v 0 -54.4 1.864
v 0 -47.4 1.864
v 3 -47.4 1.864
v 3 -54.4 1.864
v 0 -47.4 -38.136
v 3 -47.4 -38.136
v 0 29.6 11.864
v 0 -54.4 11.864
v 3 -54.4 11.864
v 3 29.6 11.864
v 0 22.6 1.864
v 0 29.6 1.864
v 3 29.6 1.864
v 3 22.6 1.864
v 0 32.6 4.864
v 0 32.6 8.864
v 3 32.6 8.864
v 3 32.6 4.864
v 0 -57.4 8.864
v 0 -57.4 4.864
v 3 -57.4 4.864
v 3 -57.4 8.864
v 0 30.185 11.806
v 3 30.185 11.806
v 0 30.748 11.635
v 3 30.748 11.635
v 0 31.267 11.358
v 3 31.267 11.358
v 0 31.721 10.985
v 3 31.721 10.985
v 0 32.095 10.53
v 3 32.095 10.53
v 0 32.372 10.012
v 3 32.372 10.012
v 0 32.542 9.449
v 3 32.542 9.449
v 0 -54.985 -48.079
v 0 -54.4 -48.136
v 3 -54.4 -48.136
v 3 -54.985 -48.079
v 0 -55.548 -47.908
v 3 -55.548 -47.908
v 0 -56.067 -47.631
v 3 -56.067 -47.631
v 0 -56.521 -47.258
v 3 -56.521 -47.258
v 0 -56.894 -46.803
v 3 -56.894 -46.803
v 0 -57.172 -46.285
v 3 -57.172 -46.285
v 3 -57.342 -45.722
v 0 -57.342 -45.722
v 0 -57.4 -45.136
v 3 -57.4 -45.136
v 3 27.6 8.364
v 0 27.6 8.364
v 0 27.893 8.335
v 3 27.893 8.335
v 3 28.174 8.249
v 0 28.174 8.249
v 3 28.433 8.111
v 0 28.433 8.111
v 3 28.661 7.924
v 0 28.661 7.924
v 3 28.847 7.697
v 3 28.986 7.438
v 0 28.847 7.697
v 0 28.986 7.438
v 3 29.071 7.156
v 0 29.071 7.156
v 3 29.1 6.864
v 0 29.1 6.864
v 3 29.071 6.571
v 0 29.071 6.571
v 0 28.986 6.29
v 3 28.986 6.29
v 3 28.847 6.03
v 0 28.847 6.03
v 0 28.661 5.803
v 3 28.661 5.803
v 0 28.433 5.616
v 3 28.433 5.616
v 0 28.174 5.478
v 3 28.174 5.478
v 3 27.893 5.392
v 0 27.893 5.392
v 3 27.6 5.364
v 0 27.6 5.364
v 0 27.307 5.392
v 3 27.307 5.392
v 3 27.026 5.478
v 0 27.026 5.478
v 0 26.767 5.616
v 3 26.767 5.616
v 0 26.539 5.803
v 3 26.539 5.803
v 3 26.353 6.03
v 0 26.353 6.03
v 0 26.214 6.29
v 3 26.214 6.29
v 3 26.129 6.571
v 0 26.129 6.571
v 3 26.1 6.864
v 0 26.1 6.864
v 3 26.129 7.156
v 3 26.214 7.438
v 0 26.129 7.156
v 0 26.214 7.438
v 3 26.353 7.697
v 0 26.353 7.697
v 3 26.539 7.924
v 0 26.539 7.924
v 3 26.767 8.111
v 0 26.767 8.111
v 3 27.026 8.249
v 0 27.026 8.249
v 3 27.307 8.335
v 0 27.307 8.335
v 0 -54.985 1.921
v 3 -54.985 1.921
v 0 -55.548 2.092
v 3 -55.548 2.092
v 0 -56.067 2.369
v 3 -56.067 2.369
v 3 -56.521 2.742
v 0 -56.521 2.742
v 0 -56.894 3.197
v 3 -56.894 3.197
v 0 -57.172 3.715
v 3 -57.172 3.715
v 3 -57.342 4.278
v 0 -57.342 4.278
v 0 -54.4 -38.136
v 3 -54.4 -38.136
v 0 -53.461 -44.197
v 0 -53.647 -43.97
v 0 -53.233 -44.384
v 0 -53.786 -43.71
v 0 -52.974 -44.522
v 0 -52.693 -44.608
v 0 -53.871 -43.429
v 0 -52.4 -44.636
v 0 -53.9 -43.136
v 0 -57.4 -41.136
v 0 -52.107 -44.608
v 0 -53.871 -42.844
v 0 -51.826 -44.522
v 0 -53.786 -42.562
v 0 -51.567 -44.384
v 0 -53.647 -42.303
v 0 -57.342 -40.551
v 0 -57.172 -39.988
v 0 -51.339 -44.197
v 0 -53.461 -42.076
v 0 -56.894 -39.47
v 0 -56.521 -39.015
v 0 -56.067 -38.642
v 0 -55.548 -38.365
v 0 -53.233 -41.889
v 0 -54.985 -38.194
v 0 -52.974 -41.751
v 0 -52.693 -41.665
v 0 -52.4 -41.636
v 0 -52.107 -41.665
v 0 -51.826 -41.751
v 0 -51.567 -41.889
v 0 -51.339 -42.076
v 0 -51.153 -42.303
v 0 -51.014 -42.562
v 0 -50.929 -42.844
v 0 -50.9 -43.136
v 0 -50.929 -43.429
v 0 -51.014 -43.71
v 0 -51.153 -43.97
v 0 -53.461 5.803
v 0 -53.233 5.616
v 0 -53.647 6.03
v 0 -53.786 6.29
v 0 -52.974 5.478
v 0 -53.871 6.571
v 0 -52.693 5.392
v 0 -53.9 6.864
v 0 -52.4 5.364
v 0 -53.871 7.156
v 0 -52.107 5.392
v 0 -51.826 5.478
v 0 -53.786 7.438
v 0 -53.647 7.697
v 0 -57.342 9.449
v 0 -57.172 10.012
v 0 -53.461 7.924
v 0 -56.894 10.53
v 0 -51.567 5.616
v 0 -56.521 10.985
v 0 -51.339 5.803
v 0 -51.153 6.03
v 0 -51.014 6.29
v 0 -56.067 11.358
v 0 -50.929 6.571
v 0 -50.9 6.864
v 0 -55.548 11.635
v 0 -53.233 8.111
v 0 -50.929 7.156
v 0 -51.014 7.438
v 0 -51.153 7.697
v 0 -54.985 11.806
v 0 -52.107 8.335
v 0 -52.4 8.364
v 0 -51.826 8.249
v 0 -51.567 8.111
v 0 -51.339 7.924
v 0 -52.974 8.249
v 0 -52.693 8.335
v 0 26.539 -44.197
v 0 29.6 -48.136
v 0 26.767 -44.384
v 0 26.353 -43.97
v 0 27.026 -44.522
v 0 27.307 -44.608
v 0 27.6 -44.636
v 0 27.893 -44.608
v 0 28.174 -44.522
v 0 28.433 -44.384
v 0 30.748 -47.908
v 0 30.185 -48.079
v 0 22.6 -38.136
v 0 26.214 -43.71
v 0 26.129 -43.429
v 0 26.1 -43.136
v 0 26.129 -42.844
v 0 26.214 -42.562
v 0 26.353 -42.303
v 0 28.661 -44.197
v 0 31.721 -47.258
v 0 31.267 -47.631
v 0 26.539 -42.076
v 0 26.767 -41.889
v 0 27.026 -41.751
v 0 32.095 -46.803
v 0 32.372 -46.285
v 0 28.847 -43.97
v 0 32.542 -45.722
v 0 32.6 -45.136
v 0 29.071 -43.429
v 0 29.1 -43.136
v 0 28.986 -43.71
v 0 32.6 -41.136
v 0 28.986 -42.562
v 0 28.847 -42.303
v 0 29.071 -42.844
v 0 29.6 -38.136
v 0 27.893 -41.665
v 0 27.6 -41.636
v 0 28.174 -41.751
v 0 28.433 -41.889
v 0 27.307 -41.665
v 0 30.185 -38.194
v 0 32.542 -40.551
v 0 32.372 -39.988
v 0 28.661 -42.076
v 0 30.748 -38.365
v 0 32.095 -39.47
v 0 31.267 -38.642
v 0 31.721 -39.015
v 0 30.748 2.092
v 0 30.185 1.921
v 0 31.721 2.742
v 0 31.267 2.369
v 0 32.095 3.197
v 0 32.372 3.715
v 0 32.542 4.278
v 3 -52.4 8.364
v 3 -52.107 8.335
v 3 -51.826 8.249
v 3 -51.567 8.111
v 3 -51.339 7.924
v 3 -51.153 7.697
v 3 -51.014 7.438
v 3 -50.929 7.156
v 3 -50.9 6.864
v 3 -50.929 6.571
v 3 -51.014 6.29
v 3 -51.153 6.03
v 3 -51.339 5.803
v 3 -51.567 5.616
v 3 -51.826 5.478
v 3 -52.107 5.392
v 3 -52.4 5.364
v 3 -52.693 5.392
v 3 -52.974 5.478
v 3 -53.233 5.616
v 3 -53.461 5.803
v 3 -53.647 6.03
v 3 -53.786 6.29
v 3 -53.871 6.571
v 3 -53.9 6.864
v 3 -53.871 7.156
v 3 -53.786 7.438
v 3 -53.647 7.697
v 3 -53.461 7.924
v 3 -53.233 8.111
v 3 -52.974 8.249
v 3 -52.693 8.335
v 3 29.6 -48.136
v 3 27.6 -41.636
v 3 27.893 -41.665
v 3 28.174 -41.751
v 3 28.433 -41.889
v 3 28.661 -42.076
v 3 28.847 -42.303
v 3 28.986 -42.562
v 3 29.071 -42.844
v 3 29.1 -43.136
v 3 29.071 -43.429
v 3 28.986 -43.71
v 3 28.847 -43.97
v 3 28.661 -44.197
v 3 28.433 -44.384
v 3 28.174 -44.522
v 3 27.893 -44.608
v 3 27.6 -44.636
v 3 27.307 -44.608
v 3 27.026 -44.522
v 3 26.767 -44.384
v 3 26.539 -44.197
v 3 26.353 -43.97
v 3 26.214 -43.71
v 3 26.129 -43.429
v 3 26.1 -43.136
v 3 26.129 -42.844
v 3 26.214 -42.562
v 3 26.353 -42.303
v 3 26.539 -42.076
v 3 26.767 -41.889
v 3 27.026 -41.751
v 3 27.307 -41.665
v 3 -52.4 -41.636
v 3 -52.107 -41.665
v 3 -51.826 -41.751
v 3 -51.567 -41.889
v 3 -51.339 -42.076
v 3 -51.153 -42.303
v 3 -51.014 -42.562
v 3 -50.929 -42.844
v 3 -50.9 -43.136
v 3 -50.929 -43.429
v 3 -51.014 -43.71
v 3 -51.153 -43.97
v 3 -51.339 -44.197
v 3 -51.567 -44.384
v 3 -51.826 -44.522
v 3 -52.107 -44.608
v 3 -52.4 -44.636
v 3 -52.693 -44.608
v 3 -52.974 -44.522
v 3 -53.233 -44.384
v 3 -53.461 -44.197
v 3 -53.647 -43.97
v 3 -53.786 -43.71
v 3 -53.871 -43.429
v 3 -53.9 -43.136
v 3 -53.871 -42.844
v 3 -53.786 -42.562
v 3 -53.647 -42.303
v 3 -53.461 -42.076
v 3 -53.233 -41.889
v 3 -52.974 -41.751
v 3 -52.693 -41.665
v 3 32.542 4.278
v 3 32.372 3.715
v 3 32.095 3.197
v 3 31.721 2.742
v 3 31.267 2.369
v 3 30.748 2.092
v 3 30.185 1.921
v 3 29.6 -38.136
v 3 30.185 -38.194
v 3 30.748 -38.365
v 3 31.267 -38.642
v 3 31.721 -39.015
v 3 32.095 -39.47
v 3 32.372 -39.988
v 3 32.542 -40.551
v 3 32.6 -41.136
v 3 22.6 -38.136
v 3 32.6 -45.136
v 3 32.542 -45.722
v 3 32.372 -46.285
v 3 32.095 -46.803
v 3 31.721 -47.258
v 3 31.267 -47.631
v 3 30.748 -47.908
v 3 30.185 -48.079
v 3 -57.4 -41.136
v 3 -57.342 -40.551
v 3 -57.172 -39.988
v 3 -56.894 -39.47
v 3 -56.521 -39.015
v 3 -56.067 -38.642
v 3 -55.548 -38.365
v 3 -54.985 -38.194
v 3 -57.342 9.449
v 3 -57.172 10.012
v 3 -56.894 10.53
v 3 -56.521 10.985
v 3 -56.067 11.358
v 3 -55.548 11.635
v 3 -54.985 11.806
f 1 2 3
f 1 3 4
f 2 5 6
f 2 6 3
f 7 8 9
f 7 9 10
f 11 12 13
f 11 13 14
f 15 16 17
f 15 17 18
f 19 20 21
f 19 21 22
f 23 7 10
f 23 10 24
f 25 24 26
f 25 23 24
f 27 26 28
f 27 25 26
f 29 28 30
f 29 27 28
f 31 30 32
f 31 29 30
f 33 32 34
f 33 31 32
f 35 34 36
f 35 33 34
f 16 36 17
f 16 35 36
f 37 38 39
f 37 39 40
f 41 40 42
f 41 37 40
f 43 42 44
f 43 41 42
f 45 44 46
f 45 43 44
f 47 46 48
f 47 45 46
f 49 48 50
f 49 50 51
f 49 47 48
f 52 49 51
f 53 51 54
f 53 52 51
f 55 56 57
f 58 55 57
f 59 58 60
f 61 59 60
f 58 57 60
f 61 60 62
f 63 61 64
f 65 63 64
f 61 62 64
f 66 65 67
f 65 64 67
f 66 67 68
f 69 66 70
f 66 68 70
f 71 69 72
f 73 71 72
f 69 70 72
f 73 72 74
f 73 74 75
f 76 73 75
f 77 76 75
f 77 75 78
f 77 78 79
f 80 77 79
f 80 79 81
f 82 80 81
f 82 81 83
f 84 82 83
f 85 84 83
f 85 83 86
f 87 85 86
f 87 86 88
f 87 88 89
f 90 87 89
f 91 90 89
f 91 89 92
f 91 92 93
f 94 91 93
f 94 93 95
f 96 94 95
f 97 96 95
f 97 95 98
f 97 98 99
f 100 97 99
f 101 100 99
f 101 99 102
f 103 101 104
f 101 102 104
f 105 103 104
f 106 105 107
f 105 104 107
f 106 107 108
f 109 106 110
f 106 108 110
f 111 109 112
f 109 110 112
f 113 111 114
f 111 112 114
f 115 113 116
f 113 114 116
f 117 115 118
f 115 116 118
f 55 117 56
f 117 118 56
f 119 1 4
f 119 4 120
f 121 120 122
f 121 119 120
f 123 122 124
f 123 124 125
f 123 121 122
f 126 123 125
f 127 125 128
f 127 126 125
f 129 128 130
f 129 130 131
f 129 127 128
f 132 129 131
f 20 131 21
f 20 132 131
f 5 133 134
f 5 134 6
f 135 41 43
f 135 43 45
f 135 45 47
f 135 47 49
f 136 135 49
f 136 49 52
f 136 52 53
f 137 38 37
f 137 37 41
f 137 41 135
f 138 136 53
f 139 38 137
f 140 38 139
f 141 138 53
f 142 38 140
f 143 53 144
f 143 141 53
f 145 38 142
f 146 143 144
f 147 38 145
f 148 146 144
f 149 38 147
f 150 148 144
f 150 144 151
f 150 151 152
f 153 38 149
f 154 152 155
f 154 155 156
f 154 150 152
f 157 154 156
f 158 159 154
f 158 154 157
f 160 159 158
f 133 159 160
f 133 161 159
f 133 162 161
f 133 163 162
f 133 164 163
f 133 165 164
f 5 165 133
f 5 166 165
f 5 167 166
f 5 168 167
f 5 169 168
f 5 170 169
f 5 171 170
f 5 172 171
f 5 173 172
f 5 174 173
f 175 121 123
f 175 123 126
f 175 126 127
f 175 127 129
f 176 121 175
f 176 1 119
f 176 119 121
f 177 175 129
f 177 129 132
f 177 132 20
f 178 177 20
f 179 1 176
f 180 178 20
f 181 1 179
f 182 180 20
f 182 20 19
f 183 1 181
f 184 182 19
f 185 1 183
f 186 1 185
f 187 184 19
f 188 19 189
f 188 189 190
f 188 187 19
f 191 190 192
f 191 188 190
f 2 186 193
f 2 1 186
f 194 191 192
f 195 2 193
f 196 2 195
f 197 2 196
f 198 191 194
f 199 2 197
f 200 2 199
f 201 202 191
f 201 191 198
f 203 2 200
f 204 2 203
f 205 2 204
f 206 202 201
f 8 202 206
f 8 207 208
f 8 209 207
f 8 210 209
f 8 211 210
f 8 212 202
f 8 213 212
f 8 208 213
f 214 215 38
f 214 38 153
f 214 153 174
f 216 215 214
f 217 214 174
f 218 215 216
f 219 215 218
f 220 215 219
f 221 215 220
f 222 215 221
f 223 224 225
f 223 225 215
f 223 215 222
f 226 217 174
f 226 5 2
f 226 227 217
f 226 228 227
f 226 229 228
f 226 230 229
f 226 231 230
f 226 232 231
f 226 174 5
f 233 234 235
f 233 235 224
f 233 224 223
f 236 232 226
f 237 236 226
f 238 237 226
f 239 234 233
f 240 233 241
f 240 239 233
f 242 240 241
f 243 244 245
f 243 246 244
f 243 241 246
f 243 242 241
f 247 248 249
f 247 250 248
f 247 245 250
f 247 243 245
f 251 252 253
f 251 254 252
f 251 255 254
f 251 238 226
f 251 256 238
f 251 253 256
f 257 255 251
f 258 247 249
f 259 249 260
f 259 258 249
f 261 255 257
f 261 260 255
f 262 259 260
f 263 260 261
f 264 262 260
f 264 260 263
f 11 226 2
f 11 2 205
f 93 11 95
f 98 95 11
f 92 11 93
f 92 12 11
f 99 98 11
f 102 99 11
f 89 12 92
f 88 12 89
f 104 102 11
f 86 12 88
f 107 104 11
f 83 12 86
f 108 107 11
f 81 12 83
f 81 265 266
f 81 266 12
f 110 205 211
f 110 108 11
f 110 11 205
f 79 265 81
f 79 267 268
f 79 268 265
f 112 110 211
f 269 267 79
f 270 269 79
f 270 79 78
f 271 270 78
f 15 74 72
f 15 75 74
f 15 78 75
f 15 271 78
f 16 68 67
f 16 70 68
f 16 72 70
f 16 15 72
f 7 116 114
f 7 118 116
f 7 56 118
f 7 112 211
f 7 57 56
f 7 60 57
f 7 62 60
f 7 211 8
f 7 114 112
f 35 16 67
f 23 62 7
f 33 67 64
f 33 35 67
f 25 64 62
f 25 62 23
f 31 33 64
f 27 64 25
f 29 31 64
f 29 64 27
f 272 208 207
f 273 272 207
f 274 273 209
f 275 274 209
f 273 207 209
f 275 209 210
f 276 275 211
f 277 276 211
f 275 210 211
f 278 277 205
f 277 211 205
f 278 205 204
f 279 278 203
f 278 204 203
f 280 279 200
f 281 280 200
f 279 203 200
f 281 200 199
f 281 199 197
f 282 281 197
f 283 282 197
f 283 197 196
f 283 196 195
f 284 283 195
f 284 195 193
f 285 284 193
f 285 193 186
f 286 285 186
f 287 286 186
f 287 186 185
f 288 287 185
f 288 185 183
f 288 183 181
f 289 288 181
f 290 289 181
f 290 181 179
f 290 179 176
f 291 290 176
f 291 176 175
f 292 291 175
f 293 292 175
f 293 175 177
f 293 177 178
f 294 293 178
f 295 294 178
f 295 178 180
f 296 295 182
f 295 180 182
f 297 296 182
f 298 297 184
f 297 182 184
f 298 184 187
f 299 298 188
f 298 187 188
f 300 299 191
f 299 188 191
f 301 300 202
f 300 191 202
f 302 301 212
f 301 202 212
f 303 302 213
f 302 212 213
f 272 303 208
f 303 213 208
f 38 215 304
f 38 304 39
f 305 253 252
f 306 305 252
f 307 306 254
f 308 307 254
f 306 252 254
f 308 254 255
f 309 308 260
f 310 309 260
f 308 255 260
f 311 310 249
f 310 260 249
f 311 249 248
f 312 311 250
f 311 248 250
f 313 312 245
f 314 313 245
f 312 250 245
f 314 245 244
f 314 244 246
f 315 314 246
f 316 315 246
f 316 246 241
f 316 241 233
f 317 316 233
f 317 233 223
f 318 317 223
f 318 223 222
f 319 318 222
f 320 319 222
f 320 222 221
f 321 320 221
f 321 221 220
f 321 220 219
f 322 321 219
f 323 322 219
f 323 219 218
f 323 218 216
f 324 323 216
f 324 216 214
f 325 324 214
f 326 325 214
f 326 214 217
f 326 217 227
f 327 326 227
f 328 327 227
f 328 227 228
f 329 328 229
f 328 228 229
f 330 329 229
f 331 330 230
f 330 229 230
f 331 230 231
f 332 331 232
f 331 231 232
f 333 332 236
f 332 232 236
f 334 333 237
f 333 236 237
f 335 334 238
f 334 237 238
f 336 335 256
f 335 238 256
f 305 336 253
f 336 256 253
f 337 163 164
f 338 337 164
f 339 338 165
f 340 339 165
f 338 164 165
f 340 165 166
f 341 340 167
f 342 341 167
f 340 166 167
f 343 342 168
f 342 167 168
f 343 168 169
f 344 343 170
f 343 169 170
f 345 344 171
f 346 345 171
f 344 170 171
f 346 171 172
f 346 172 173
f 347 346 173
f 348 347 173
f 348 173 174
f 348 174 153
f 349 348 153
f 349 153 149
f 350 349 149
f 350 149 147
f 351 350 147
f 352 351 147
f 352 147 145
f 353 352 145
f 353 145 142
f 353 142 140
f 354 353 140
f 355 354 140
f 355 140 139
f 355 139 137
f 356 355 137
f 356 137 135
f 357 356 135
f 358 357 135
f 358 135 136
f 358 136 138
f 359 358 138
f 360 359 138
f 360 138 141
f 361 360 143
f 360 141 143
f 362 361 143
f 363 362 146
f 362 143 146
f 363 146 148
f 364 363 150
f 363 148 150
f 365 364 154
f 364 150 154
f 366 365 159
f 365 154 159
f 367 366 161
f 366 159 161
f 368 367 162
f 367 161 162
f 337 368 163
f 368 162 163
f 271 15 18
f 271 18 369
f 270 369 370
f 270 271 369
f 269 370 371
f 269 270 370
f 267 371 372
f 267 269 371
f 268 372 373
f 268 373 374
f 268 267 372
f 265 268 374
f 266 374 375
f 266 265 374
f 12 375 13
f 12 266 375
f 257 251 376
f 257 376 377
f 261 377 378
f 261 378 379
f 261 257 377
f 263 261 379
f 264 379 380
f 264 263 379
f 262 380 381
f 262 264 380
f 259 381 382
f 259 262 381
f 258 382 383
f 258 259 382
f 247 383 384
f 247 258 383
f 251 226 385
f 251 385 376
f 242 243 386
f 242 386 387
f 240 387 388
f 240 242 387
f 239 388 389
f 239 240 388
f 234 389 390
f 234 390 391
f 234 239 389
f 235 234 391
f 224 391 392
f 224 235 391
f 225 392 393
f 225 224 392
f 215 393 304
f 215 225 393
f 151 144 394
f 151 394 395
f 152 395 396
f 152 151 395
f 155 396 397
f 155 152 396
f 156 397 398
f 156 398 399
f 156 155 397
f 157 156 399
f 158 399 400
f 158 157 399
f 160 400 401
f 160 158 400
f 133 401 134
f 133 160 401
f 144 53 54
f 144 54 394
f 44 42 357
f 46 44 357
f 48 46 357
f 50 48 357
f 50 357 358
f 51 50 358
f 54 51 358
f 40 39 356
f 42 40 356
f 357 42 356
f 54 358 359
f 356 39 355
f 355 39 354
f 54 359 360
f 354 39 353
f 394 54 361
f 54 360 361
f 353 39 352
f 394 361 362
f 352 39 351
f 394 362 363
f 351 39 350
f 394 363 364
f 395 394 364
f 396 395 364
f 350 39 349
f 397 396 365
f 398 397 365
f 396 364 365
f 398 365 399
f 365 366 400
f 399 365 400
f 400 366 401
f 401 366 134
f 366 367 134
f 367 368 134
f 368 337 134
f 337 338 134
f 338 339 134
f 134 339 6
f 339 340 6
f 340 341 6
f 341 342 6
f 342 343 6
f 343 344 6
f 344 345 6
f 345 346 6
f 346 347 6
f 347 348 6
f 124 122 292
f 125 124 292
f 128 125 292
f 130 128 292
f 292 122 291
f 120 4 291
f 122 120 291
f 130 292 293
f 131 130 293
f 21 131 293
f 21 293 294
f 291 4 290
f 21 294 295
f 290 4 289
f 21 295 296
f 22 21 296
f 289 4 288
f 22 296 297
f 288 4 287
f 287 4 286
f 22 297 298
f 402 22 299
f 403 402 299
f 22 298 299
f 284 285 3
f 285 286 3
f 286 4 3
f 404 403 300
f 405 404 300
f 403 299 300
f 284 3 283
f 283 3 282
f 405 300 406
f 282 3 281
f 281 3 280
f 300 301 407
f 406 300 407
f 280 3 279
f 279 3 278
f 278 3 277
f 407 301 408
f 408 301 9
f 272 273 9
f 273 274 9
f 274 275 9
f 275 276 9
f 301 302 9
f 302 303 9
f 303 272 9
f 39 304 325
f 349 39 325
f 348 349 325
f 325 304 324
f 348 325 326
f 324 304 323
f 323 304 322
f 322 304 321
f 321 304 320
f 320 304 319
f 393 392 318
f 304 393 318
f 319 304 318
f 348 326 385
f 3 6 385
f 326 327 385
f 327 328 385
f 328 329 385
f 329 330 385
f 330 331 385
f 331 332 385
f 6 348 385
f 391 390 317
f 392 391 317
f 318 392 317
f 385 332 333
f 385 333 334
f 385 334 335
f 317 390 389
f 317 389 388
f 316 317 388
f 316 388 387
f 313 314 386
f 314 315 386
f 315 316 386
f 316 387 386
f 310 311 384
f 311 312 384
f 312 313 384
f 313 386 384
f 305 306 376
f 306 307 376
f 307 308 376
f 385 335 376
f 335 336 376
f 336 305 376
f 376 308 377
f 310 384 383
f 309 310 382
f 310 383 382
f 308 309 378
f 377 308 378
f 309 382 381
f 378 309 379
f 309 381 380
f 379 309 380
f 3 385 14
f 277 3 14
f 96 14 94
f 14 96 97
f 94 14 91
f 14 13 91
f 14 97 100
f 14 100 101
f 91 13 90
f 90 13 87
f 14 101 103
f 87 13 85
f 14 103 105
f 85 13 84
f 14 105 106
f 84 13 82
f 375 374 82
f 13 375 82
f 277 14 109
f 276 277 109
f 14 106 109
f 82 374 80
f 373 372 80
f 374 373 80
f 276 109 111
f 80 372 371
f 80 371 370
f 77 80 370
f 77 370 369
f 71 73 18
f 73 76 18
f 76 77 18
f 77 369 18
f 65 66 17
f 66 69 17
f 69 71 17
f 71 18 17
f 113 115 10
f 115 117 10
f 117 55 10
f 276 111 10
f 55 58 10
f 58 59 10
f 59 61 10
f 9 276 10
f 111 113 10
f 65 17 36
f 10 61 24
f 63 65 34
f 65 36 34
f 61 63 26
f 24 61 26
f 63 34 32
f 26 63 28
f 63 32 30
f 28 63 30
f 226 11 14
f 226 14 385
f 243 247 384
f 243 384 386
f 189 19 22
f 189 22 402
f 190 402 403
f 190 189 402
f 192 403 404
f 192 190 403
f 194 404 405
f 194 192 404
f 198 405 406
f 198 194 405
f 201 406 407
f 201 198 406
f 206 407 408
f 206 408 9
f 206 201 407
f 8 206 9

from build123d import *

# Parameters (mm, degrees)
PCB_DEPTH       = 3
ESBO_O4_R       = 1.5
FUROS_PCB_DEPTH = 75.972458232


with BuildPart() as part:
    # Esboço3 → PCB (new body)
    with BuildSketch(Plane(origin=(0, 0, 0), x_dir=(0, 0, -1), z_dir=(1, 0, 0))):
        with BuildLine():
            Line((-1.863527408, 22.600091465), (38.136472592, 22.600091465))
            Line((38.136472592, 22.600091465), (38.136472592, 29.600091465))
            ThreePointArc((38.136472592, 29.600091465), (39.015152248, 31.721411809), (41.136472592, 32.600091465))
            Line((41.136472592, 32.600091465), (45.136472592, 32.600091465))
            ThreePointArc((45.136472592, 32.600091465), (47.257792935, 31.721411809), (48.136472592, 29.600091465))
            Line((48.136472592, 29.600091465), (48.136472592, 22.600091465))
            Line((48.136472592, 22.600091465), (48.136472592, -47.399908535))
            Line((48.136472592, -47.399908535), (48.136472592, -54.399908535))
            ThreePointArc((48.136472592, -54.399908535), (47.257792935, -56.521228878), (45.136472592, -57.399908535))
            Line((45.136472592, -57.399908535), (41.136472592, -57.399908535))
            ThreePointArc((41.136472592, -57.399908535), (39.015152248, -56.521228878), (38.136472592, -54.399908535))
            Line((38.136472592, -54.399908535), (38.136472592, -47.399908535))
            Line((38.136472592, -47.399908535), (-1.863527408, -47.399908535))
            Line((-1.863527408, -47.399908535), (-1.863527408, -54.399908535))
            ThreePointArc((-1.863527408, -54.399908535), (-2.742207065, -56.521228878), (-4.863527408, -57.399908535))
            Line((-4.863527408, -57.399908535), (-8.863527408, -57.399908535))
            ThreePointArc((-8.863527408, -57.399908535), (-10.984847752, -56.521228878), (-11.863527408, -54.399908535))
            Line((-11.863527408, -54.399908535), (-11.863527408, -47.399908535))
            Line((-11.863527408, -47.399908535), (-11.863527408, 22.600091465))
            Line((-11.863527408, 22.600091465), (-11.863527408, 29.600091465))
            ThreePointArc((-11.863527408, 29.600091465), (-10.984847752, 31.721411809), (-8.863527408, 32.600091465))
            Line((-8.863527408, 32.600091465), (-4.863527408, 32.600091465))
            ThreePointArc((-4.863527408, 32.600091465), (-2.742207065, 31.721411809), (-1.863527408, 29.600091465))
            Line((-1.863527408, 29.600091465), (-1.863527408, 22.600091465))
        make_face()
    extrude(amount=PCB_DEPTH)

    # Esboço4 → Furos PCB (cut, through all)
    with BuildSketch(Plane.ZY):
        with Locations((-43.136472592, 27.600091465)):
            Circle(ESBO_O4_R)
        with Locations((6.863527408, 27.600091465)):
            Circle(ESBO_O4_R)
        with Locations((6.863527408, -52.399908535)):
            Circle(ESBO_O4_R)
        with Locations((-43.136472592, -52.399908535)):
            Circle(ESBO_O4_R)
    extrude(amount=-FUROS_PCB_DEPTH, mode=Mode.SUBTRACT)


solid = part.part
